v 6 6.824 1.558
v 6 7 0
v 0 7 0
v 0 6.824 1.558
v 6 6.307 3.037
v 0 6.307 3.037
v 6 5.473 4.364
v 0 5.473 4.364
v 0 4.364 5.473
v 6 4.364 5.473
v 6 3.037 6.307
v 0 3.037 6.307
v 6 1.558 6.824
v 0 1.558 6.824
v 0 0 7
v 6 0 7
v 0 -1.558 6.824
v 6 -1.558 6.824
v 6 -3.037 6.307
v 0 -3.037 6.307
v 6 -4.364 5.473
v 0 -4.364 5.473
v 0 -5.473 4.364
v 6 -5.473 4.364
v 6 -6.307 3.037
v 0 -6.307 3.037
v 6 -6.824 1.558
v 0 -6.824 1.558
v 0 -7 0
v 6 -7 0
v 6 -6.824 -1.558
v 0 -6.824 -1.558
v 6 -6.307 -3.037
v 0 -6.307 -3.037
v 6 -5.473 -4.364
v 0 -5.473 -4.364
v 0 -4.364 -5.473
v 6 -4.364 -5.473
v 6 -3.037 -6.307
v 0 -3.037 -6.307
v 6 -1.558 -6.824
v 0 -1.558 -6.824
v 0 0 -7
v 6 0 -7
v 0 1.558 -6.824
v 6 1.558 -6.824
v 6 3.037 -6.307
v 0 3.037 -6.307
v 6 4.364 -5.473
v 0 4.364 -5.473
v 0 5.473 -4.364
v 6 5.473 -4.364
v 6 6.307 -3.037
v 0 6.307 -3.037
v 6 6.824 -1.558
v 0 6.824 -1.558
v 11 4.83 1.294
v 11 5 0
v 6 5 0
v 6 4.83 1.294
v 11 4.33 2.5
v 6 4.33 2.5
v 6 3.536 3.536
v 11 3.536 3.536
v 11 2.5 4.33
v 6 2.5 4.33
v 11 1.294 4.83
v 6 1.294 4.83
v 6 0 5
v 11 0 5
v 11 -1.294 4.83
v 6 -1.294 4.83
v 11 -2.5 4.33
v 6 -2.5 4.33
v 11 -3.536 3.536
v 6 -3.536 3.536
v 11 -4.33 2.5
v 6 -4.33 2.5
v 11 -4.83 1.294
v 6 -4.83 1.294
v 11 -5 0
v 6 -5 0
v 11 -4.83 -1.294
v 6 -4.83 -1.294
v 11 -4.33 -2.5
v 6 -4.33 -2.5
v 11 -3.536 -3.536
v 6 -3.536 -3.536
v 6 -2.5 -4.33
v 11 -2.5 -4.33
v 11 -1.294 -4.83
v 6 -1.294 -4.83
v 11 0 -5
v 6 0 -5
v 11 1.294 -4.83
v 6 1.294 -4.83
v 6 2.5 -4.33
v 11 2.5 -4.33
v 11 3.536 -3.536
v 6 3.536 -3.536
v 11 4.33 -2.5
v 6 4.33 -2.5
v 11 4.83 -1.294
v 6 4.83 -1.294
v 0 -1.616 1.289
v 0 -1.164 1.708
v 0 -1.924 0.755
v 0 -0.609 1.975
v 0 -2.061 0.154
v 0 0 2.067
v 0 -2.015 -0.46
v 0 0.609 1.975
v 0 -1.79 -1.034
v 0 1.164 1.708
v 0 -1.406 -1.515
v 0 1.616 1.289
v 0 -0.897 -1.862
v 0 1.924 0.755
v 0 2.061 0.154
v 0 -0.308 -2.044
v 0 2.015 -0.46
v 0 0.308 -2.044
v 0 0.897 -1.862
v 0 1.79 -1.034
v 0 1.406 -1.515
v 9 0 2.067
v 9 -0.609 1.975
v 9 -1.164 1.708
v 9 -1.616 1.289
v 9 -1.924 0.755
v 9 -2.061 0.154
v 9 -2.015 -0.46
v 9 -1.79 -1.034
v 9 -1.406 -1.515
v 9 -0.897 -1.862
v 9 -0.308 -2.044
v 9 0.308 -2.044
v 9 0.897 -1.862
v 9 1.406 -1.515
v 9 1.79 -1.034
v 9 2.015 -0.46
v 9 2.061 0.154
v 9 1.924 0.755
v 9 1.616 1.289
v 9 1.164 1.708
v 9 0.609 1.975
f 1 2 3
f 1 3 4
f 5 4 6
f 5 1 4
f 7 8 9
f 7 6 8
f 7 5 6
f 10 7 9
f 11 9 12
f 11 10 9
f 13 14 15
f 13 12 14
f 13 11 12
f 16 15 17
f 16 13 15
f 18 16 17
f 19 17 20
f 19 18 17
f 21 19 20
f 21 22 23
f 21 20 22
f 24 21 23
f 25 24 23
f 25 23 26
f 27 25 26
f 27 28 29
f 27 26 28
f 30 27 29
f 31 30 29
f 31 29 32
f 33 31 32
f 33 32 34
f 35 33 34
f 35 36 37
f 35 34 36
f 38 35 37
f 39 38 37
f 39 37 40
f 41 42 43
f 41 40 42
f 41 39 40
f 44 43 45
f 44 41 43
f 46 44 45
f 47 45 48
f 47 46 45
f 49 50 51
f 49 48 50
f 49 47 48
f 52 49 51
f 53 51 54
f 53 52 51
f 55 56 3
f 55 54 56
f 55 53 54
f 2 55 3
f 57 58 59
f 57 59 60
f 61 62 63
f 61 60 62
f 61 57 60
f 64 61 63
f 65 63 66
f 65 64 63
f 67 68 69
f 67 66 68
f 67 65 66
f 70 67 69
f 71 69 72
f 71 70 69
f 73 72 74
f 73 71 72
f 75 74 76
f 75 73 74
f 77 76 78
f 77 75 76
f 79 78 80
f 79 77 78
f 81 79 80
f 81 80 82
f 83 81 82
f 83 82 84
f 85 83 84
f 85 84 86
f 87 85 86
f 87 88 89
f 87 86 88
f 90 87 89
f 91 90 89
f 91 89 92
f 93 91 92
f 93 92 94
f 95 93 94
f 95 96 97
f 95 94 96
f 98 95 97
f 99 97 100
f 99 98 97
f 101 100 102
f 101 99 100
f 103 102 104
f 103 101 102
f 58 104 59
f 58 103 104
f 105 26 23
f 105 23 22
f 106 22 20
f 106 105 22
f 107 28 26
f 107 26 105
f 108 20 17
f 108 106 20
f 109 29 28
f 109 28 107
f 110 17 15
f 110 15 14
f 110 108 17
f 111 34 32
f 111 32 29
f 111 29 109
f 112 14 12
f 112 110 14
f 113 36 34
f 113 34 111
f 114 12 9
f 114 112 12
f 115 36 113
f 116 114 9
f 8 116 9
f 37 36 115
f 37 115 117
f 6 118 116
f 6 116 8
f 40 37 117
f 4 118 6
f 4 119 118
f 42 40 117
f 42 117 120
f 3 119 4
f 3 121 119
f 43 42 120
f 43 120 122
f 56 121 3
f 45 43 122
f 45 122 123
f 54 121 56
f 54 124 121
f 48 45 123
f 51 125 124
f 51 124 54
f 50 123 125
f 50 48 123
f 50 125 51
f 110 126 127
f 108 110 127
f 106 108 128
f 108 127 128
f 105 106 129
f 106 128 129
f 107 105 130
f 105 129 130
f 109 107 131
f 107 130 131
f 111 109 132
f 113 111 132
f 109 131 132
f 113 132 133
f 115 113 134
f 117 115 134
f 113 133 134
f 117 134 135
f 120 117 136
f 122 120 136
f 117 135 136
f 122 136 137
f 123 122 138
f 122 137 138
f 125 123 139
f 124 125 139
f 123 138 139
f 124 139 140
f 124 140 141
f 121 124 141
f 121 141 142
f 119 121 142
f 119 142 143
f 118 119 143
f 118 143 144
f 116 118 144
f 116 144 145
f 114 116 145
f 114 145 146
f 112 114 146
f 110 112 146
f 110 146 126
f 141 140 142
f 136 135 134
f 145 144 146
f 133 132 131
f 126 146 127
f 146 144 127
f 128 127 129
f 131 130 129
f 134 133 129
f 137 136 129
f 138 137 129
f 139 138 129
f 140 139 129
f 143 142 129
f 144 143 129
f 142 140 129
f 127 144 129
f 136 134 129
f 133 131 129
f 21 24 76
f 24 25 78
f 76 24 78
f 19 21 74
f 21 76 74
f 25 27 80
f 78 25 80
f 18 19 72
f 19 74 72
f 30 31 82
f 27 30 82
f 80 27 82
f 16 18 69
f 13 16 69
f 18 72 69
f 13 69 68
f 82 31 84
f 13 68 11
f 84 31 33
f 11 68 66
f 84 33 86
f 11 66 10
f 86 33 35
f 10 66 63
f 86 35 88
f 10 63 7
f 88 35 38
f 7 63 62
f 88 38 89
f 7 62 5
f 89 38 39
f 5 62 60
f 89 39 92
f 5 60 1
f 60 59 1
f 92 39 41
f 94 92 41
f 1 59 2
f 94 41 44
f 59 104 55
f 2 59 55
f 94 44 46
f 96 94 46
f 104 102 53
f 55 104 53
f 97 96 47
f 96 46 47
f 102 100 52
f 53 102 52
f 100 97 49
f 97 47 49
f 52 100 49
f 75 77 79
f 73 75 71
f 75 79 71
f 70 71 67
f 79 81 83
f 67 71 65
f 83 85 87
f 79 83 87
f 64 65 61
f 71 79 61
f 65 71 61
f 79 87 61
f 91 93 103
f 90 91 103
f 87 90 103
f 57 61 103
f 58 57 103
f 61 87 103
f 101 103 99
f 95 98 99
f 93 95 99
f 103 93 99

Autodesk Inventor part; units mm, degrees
ref_plane "YZ Plane" through (0, 0, 0) normal (1, 0, 0) x (0, 1, 0)
ref_plane "XZ Plane" through (0, 0, 0) normal (0, 1, 0) x (-1, 0, 0)
ref_plane "XY Plane" through (0, 0, 0) normal (0, 0, 1) x (1, 0, 0)
sketch "Sketch1" plane through (0, 0, 0) normal (0, 0, 1) x (1, 0, 0)
  line L0 (0, 0) -> (0, 7)
  line L1 (0, 7) -> (6, 7)
  line L2 (6, 7) -> (6, 5)
  line L3 (6, 5) -> (11, 5)
  line L4 (11, 5) -> (11, 0)
  line L5 (11, 0) -> (0, 0)
  dimension "d0" = 5
  dimension "d1" = 6
  dimension "d2" = 10
  dimension "d3" = 14
revolve "Revolution1" add sketch "Sketch1" angle 360 about axis through (11, 0, 0) along (-1, 0, 0)
sketch "Sketch2" plane through (0, 0, 0) normal (-1, 0, 0) x (0, 0, 1)
  circle A0 centre (0, 0) radius 7 projected
  point P0 (0, 0)
hole "Hole1" at (0, 0, 0) direction (1, 0, 0) diameter 4.134 depth 9 thread size "M5x0.8" class "6H" standard "ISO Metric profile"
properties part number "1 part 16"
